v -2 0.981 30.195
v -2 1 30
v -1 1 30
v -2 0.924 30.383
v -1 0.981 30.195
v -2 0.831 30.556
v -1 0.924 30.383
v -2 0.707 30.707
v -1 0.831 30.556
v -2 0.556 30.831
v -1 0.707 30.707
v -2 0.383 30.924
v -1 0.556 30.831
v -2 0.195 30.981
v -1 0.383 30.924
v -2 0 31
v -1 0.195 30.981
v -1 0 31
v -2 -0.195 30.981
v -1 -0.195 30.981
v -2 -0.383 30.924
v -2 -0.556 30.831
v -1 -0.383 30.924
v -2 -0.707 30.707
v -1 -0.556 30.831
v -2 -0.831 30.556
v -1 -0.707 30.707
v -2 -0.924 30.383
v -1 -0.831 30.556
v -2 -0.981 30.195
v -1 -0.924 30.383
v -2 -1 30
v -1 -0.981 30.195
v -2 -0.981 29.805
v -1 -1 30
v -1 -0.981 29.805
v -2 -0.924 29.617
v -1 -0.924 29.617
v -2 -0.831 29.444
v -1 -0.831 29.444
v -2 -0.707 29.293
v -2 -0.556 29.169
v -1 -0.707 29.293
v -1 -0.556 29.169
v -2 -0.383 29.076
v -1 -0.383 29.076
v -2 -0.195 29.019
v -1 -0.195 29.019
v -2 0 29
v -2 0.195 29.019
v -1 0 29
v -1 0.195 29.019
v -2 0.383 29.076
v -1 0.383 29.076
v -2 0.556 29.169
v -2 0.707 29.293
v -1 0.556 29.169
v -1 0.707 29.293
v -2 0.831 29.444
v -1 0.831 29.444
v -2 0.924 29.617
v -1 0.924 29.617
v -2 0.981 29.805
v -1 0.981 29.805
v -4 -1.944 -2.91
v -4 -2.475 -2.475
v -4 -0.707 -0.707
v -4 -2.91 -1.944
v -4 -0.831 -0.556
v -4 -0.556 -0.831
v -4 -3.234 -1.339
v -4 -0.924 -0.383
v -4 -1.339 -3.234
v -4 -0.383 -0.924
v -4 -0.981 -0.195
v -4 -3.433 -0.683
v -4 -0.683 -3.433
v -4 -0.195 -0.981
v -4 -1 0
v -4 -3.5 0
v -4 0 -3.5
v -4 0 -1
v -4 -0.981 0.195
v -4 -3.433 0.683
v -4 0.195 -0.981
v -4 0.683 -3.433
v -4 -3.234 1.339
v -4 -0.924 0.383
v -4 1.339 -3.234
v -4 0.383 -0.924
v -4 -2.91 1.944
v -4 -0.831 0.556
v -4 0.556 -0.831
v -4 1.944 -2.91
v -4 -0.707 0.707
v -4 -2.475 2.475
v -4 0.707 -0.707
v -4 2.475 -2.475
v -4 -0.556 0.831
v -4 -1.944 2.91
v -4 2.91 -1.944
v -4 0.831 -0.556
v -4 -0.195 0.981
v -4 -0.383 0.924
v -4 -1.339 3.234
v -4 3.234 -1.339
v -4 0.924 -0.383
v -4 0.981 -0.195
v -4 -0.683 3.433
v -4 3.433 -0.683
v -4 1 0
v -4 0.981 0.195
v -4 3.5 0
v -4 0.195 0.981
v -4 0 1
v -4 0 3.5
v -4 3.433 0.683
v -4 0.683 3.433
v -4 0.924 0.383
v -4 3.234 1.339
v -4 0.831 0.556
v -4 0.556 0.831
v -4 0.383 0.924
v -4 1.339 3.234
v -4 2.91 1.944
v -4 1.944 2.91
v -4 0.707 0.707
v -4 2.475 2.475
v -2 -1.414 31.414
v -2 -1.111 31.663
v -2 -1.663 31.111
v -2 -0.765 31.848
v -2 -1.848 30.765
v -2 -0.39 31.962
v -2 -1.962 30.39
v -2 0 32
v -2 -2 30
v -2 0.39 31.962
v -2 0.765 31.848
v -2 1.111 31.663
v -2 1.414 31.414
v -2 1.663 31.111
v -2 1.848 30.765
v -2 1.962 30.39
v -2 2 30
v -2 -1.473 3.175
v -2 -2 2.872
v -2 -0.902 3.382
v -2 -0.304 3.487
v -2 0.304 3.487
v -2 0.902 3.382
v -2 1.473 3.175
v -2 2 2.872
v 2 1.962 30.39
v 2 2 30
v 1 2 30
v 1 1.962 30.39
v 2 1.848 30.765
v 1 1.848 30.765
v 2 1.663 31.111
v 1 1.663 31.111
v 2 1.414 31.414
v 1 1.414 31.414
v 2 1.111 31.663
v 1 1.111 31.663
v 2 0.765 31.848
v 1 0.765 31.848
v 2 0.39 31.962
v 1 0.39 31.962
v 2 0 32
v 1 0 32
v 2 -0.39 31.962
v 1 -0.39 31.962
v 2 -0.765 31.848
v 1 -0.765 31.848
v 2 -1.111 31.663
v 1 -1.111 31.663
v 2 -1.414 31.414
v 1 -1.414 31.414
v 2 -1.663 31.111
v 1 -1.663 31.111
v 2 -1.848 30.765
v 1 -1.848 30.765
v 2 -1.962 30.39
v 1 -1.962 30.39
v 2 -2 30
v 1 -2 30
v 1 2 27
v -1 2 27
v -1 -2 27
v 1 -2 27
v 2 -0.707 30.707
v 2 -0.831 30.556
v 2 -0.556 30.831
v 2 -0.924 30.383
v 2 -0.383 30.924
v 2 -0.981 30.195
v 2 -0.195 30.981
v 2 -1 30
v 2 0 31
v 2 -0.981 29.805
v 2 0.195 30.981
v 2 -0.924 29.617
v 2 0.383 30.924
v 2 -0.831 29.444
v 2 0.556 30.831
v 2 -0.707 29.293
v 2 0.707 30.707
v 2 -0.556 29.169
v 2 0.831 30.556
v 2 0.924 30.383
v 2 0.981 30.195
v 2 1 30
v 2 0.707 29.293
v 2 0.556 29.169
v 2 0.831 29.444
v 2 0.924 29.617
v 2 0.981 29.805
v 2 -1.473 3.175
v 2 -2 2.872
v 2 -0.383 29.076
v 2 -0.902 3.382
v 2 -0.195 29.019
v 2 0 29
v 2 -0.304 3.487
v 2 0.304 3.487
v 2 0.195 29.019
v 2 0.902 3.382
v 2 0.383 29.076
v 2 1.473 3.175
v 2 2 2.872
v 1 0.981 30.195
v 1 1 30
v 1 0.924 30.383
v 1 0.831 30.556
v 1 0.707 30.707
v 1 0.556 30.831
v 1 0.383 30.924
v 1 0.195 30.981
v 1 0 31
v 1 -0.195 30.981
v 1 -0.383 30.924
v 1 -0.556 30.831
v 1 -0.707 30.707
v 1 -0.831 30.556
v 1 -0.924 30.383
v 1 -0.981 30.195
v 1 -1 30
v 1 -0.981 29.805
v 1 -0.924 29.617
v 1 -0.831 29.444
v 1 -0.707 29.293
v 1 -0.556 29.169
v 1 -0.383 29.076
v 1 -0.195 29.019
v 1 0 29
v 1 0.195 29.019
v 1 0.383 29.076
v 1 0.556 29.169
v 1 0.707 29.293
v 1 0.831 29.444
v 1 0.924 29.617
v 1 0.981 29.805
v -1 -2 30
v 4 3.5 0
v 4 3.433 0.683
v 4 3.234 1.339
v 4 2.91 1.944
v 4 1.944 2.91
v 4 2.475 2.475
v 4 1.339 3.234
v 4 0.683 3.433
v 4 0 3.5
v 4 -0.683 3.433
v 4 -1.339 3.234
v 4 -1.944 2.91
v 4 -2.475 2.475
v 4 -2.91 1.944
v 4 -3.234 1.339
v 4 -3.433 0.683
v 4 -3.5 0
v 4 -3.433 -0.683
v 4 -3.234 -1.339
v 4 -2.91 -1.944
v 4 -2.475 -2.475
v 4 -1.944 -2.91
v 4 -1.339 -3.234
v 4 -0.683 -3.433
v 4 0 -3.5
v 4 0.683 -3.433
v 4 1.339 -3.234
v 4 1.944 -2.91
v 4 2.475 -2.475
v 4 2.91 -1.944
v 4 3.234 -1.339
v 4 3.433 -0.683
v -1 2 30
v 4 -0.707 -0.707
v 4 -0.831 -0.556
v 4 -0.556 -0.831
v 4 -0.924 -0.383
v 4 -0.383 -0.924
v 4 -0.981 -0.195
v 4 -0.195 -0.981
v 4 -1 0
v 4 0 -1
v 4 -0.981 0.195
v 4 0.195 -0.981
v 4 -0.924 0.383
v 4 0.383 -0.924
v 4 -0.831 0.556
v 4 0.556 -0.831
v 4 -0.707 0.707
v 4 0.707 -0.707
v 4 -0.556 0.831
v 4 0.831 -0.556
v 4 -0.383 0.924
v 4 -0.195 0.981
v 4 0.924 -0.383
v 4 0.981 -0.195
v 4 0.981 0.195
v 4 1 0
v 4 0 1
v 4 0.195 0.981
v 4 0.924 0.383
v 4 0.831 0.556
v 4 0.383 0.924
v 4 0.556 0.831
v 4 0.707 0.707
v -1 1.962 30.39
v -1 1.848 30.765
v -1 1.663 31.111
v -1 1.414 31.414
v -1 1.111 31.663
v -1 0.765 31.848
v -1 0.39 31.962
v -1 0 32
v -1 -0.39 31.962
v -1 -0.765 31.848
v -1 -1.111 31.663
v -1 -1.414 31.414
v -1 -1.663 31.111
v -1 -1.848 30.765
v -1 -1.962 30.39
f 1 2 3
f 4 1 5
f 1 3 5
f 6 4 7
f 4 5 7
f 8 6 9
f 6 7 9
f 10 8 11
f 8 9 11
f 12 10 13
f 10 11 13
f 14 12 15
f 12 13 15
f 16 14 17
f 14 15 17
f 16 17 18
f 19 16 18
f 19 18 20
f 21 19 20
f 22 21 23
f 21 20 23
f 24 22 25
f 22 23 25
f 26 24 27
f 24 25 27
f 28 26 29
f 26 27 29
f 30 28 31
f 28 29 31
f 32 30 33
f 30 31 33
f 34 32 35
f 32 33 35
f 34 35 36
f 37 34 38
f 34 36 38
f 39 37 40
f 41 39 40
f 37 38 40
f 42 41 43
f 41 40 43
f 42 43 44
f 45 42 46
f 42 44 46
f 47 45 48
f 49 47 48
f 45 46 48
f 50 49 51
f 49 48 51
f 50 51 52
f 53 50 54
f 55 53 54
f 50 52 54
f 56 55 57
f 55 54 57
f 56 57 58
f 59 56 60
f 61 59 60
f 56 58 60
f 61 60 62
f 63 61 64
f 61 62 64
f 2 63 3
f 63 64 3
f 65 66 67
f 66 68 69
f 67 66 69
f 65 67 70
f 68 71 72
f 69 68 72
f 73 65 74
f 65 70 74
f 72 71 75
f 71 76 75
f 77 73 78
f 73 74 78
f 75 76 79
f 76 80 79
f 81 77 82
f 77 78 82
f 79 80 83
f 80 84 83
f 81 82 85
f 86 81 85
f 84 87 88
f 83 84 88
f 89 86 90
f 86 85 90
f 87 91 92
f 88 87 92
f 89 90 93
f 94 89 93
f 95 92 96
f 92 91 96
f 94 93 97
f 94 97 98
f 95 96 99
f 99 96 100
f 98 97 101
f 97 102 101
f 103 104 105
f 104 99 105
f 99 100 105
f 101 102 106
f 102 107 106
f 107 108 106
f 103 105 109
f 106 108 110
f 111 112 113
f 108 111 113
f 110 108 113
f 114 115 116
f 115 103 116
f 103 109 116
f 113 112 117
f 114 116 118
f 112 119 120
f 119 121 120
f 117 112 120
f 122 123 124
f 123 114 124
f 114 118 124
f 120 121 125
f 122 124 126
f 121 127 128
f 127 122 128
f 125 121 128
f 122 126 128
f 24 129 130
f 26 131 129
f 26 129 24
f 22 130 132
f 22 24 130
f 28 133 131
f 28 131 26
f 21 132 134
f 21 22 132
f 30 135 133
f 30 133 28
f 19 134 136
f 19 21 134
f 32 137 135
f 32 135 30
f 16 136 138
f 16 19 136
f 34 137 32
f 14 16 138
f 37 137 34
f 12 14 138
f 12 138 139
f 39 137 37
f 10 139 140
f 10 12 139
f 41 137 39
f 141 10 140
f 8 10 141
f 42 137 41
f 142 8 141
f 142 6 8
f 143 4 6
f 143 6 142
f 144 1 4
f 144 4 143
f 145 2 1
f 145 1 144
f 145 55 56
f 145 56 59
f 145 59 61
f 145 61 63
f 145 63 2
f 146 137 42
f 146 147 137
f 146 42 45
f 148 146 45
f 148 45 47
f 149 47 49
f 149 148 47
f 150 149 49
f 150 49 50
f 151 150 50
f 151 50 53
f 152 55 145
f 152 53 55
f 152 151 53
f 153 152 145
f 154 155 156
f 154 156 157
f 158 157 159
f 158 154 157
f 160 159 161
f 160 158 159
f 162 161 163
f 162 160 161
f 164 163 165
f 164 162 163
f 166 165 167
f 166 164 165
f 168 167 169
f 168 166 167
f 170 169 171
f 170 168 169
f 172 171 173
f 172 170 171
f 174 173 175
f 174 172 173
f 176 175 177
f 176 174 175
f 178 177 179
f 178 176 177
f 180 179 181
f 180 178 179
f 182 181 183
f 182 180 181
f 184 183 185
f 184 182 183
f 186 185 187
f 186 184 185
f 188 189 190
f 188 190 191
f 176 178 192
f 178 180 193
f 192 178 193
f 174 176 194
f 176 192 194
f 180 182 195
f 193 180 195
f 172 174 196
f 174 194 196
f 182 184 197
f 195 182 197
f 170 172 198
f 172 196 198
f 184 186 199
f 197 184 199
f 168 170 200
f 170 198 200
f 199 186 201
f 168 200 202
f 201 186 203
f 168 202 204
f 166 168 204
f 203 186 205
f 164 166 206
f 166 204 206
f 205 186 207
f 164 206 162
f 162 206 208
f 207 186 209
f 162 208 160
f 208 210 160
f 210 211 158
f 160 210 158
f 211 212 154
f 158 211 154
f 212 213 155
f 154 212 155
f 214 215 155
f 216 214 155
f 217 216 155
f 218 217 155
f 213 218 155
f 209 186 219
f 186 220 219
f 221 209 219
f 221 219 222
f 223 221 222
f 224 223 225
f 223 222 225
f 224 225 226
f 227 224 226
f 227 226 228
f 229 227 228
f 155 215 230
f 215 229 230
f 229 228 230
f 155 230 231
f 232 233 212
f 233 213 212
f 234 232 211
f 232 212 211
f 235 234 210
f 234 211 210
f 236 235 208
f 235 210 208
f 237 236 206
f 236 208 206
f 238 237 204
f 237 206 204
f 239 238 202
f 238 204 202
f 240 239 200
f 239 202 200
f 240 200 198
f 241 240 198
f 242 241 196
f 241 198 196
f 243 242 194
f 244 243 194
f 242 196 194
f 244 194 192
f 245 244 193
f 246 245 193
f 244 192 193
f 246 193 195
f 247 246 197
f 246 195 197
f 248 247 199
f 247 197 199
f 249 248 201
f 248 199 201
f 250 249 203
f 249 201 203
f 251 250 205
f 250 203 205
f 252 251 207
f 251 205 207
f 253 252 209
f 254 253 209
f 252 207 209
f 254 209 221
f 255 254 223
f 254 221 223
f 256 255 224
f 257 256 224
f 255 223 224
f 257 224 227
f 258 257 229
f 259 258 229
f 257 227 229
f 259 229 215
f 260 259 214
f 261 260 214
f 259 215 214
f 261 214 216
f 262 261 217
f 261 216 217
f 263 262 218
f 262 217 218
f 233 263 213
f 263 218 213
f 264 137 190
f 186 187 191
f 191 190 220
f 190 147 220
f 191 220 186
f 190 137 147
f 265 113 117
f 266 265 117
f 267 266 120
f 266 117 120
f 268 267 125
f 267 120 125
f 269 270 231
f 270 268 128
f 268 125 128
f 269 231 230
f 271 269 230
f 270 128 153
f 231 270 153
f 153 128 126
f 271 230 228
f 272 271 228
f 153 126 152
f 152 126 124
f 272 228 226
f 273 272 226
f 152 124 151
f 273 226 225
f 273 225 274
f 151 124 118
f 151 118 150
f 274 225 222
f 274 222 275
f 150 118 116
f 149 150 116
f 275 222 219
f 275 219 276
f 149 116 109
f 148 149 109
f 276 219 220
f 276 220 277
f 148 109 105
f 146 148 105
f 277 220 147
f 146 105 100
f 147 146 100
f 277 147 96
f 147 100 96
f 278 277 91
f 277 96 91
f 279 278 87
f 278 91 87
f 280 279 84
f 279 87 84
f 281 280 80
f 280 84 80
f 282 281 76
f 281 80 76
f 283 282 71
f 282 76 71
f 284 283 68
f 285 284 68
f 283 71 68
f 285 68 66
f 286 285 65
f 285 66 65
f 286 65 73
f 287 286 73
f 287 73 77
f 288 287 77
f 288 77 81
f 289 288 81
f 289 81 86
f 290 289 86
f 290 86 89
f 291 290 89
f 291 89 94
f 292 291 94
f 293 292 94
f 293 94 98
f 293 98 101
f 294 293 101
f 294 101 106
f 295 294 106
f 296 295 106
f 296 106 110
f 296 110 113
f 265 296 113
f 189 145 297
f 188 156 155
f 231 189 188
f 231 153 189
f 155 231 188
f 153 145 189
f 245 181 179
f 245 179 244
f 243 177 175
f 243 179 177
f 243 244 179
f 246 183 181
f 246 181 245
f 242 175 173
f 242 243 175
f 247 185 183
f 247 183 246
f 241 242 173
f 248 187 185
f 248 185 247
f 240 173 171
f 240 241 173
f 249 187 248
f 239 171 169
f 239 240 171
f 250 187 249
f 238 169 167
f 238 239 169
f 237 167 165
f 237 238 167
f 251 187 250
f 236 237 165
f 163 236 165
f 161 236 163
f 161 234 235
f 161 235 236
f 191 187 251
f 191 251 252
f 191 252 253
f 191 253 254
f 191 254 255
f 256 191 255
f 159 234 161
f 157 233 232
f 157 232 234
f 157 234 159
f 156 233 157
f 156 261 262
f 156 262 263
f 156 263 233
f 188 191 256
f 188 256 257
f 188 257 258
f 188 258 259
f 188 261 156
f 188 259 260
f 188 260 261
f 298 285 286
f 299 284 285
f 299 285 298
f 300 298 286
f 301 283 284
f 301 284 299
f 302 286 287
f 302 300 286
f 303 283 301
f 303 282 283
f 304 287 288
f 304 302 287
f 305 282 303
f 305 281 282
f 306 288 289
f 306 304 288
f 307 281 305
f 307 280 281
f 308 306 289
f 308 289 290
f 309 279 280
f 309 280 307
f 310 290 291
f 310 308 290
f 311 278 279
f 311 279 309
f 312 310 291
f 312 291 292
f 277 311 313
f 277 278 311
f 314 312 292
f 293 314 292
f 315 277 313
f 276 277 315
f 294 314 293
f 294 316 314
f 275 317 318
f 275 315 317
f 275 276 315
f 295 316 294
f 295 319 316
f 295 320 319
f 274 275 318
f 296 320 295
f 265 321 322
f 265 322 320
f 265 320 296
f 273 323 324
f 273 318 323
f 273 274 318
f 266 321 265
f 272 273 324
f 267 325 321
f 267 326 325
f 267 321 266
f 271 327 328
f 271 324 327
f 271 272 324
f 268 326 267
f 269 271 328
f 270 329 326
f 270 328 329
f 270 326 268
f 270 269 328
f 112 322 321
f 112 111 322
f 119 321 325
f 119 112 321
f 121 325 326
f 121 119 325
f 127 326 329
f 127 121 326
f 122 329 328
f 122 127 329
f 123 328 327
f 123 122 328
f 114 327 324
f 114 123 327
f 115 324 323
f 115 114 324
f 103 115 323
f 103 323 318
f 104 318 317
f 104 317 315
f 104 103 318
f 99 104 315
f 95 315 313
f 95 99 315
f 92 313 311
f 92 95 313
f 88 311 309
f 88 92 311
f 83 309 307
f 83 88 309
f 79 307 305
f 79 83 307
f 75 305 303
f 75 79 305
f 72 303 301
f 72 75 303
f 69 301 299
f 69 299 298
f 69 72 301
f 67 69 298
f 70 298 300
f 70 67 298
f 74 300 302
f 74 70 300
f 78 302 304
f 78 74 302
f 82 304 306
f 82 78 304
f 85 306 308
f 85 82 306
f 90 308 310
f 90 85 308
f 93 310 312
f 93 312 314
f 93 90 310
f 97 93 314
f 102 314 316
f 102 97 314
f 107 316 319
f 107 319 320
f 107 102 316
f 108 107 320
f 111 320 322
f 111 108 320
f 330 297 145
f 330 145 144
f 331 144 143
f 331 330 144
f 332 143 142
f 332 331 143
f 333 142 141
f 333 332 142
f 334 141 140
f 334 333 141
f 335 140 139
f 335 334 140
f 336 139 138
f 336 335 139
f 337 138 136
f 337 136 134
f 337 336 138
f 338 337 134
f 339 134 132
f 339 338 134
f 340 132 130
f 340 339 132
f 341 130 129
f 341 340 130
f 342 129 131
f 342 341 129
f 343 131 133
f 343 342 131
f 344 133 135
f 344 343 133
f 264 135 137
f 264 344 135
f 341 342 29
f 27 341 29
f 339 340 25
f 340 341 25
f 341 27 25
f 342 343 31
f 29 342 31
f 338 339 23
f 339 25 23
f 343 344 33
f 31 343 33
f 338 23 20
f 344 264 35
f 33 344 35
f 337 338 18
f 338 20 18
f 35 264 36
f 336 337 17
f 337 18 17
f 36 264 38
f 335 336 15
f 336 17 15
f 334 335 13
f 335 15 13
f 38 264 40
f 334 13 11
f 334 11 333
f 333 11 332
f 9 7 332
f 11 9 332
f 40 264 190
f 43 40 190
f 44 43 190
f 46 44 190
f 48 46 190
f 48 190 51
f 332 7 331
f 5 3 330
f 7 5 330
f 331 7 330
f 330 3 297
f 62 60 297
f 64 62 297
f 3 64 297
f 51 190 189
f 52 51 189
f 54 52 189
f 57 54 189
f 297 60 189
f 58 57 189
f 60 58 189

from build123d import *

# Parameters (mm, degrees)
SKETCH1_W                = 4
SKETCH1_H                = 4
BOSS_EXTRUDE1_DEPTH      = 30
SKETCH2_R                = 2
SKETCH2_R_2              = 1
BOSS_EXTRUDE2_DEPTH      = 4
SKETCH3_R                = 1
CUT_EXTRUDE1_DEPTH       = 33.310988843
BOSS_EXTRUDE3_DEPTH      = 2
BOSS_EXTRUDE3_DEPTH_BACK = 6
SKETCH4_R                = 3.5
SKETCH4_R_2              = 1
SKETCH5_R                = 1
CUT_EXTRUDE2_DEPTH       = 34.170016581
CUT_EXTRUDE3_DEPTH       = 10
CUT_EXTRUDE3_DEPTH_BACK  = 2
SKETCH6_W                = 2
SKETCH6_H                = 5


with BuildPart() as part:
    # Sketch1 → Boss-Extrude1 (new body)
    with BuildSketch(Plane.XY):
        Rectangle(SKETCH1_W, SKETCH1_H)
    extrude(amount=BOSS_EXTRUDE1_DEPTH)

    # Sketch2 → Boss-Extrude2 (add)
    with BuildSketch(Plane(origin=(2, 0, 0), x_dir=(0, 0, -1), z_dir=(1, 0, 0))):
        with Locations((-30, 0)):
            Circle(SKETCH2_R)
        with Locations((-30, 0)):
            Circle(SKETCH2_R_2, mode=Mode.SUBTRACT)
    extrude(amount=-BOSS_EXTRUDE2_DEPTH)

    # Sketch3 → Cut-Extrude1 (cut, through all)
    with BuildSketch(Plane(origin=(2, 0, 0), x_dir=(0, 0, -1), z_dir=(1, 0, 0))):
        with Locations(Location((-30, 0, 0), (0, 0, 90))):
            Circle(SKETCH3_R)
    extrude(amount=-CUT_EXTRUDE1_DEPTH, mode=Mode.SUBTRACT)

    # Sketch4 → Boss-Extrude3 (add, two sides: drawn at the far end of the back side and taken through both)
    with BuildSketch(Plane(origin=(2, 0, 0), x_dir=(0, 0, -1), z_dir=(1, 0, 0)).offset(-BOSS_EXTRUDE3_DEPTH_BACK)):
        with Locations(Location((0, 0, 0), (0, 0, 90))):
            Circle(SKETCH4_R)
        with Locations(Location((0, 0, 0), (0, 0, 90))):
            Circle(SKETCH4_R_2, mode=Mode.SUBTRACT)
    extrude(amount=BOSS_EXTRUDE3_DEPTH + BOSS_EXTRUDE3_DEPTH_BACK)

    # Sketch5 → Cut-Extrude2 (cut, through all)
    with BuildSketch(Plane(origin=(4, 0, 0), x_dir=(0, 0, -1), z_dir=(1, 0, 0))):
        with Locations(Location((0, 0, 0), (0, 0, 90))):
            Circle(SKETCH5_R)
    extrude(amount=-CUT_EXTRUDE2_DEPTH, mode=Mode.SUBTRACT)

    # Sketch6 → Cut-Extrude3 (cut, two sides: drawn at the far end of the back side and taken through both)
    with BuildSketch(Plane.XY.offset(29).offset(-CUT_EXTRUDE3_DEPTH_BACK)):
        Rectangle(SKETCH6_W, SKETCH6_H)
    extrude(amount=CUT_EXTRUDE3_DEPTH + CUT_EXTRUDE3_DEPTH_BACK, mode=Mode.SUBTRACT)


solid = part.part
